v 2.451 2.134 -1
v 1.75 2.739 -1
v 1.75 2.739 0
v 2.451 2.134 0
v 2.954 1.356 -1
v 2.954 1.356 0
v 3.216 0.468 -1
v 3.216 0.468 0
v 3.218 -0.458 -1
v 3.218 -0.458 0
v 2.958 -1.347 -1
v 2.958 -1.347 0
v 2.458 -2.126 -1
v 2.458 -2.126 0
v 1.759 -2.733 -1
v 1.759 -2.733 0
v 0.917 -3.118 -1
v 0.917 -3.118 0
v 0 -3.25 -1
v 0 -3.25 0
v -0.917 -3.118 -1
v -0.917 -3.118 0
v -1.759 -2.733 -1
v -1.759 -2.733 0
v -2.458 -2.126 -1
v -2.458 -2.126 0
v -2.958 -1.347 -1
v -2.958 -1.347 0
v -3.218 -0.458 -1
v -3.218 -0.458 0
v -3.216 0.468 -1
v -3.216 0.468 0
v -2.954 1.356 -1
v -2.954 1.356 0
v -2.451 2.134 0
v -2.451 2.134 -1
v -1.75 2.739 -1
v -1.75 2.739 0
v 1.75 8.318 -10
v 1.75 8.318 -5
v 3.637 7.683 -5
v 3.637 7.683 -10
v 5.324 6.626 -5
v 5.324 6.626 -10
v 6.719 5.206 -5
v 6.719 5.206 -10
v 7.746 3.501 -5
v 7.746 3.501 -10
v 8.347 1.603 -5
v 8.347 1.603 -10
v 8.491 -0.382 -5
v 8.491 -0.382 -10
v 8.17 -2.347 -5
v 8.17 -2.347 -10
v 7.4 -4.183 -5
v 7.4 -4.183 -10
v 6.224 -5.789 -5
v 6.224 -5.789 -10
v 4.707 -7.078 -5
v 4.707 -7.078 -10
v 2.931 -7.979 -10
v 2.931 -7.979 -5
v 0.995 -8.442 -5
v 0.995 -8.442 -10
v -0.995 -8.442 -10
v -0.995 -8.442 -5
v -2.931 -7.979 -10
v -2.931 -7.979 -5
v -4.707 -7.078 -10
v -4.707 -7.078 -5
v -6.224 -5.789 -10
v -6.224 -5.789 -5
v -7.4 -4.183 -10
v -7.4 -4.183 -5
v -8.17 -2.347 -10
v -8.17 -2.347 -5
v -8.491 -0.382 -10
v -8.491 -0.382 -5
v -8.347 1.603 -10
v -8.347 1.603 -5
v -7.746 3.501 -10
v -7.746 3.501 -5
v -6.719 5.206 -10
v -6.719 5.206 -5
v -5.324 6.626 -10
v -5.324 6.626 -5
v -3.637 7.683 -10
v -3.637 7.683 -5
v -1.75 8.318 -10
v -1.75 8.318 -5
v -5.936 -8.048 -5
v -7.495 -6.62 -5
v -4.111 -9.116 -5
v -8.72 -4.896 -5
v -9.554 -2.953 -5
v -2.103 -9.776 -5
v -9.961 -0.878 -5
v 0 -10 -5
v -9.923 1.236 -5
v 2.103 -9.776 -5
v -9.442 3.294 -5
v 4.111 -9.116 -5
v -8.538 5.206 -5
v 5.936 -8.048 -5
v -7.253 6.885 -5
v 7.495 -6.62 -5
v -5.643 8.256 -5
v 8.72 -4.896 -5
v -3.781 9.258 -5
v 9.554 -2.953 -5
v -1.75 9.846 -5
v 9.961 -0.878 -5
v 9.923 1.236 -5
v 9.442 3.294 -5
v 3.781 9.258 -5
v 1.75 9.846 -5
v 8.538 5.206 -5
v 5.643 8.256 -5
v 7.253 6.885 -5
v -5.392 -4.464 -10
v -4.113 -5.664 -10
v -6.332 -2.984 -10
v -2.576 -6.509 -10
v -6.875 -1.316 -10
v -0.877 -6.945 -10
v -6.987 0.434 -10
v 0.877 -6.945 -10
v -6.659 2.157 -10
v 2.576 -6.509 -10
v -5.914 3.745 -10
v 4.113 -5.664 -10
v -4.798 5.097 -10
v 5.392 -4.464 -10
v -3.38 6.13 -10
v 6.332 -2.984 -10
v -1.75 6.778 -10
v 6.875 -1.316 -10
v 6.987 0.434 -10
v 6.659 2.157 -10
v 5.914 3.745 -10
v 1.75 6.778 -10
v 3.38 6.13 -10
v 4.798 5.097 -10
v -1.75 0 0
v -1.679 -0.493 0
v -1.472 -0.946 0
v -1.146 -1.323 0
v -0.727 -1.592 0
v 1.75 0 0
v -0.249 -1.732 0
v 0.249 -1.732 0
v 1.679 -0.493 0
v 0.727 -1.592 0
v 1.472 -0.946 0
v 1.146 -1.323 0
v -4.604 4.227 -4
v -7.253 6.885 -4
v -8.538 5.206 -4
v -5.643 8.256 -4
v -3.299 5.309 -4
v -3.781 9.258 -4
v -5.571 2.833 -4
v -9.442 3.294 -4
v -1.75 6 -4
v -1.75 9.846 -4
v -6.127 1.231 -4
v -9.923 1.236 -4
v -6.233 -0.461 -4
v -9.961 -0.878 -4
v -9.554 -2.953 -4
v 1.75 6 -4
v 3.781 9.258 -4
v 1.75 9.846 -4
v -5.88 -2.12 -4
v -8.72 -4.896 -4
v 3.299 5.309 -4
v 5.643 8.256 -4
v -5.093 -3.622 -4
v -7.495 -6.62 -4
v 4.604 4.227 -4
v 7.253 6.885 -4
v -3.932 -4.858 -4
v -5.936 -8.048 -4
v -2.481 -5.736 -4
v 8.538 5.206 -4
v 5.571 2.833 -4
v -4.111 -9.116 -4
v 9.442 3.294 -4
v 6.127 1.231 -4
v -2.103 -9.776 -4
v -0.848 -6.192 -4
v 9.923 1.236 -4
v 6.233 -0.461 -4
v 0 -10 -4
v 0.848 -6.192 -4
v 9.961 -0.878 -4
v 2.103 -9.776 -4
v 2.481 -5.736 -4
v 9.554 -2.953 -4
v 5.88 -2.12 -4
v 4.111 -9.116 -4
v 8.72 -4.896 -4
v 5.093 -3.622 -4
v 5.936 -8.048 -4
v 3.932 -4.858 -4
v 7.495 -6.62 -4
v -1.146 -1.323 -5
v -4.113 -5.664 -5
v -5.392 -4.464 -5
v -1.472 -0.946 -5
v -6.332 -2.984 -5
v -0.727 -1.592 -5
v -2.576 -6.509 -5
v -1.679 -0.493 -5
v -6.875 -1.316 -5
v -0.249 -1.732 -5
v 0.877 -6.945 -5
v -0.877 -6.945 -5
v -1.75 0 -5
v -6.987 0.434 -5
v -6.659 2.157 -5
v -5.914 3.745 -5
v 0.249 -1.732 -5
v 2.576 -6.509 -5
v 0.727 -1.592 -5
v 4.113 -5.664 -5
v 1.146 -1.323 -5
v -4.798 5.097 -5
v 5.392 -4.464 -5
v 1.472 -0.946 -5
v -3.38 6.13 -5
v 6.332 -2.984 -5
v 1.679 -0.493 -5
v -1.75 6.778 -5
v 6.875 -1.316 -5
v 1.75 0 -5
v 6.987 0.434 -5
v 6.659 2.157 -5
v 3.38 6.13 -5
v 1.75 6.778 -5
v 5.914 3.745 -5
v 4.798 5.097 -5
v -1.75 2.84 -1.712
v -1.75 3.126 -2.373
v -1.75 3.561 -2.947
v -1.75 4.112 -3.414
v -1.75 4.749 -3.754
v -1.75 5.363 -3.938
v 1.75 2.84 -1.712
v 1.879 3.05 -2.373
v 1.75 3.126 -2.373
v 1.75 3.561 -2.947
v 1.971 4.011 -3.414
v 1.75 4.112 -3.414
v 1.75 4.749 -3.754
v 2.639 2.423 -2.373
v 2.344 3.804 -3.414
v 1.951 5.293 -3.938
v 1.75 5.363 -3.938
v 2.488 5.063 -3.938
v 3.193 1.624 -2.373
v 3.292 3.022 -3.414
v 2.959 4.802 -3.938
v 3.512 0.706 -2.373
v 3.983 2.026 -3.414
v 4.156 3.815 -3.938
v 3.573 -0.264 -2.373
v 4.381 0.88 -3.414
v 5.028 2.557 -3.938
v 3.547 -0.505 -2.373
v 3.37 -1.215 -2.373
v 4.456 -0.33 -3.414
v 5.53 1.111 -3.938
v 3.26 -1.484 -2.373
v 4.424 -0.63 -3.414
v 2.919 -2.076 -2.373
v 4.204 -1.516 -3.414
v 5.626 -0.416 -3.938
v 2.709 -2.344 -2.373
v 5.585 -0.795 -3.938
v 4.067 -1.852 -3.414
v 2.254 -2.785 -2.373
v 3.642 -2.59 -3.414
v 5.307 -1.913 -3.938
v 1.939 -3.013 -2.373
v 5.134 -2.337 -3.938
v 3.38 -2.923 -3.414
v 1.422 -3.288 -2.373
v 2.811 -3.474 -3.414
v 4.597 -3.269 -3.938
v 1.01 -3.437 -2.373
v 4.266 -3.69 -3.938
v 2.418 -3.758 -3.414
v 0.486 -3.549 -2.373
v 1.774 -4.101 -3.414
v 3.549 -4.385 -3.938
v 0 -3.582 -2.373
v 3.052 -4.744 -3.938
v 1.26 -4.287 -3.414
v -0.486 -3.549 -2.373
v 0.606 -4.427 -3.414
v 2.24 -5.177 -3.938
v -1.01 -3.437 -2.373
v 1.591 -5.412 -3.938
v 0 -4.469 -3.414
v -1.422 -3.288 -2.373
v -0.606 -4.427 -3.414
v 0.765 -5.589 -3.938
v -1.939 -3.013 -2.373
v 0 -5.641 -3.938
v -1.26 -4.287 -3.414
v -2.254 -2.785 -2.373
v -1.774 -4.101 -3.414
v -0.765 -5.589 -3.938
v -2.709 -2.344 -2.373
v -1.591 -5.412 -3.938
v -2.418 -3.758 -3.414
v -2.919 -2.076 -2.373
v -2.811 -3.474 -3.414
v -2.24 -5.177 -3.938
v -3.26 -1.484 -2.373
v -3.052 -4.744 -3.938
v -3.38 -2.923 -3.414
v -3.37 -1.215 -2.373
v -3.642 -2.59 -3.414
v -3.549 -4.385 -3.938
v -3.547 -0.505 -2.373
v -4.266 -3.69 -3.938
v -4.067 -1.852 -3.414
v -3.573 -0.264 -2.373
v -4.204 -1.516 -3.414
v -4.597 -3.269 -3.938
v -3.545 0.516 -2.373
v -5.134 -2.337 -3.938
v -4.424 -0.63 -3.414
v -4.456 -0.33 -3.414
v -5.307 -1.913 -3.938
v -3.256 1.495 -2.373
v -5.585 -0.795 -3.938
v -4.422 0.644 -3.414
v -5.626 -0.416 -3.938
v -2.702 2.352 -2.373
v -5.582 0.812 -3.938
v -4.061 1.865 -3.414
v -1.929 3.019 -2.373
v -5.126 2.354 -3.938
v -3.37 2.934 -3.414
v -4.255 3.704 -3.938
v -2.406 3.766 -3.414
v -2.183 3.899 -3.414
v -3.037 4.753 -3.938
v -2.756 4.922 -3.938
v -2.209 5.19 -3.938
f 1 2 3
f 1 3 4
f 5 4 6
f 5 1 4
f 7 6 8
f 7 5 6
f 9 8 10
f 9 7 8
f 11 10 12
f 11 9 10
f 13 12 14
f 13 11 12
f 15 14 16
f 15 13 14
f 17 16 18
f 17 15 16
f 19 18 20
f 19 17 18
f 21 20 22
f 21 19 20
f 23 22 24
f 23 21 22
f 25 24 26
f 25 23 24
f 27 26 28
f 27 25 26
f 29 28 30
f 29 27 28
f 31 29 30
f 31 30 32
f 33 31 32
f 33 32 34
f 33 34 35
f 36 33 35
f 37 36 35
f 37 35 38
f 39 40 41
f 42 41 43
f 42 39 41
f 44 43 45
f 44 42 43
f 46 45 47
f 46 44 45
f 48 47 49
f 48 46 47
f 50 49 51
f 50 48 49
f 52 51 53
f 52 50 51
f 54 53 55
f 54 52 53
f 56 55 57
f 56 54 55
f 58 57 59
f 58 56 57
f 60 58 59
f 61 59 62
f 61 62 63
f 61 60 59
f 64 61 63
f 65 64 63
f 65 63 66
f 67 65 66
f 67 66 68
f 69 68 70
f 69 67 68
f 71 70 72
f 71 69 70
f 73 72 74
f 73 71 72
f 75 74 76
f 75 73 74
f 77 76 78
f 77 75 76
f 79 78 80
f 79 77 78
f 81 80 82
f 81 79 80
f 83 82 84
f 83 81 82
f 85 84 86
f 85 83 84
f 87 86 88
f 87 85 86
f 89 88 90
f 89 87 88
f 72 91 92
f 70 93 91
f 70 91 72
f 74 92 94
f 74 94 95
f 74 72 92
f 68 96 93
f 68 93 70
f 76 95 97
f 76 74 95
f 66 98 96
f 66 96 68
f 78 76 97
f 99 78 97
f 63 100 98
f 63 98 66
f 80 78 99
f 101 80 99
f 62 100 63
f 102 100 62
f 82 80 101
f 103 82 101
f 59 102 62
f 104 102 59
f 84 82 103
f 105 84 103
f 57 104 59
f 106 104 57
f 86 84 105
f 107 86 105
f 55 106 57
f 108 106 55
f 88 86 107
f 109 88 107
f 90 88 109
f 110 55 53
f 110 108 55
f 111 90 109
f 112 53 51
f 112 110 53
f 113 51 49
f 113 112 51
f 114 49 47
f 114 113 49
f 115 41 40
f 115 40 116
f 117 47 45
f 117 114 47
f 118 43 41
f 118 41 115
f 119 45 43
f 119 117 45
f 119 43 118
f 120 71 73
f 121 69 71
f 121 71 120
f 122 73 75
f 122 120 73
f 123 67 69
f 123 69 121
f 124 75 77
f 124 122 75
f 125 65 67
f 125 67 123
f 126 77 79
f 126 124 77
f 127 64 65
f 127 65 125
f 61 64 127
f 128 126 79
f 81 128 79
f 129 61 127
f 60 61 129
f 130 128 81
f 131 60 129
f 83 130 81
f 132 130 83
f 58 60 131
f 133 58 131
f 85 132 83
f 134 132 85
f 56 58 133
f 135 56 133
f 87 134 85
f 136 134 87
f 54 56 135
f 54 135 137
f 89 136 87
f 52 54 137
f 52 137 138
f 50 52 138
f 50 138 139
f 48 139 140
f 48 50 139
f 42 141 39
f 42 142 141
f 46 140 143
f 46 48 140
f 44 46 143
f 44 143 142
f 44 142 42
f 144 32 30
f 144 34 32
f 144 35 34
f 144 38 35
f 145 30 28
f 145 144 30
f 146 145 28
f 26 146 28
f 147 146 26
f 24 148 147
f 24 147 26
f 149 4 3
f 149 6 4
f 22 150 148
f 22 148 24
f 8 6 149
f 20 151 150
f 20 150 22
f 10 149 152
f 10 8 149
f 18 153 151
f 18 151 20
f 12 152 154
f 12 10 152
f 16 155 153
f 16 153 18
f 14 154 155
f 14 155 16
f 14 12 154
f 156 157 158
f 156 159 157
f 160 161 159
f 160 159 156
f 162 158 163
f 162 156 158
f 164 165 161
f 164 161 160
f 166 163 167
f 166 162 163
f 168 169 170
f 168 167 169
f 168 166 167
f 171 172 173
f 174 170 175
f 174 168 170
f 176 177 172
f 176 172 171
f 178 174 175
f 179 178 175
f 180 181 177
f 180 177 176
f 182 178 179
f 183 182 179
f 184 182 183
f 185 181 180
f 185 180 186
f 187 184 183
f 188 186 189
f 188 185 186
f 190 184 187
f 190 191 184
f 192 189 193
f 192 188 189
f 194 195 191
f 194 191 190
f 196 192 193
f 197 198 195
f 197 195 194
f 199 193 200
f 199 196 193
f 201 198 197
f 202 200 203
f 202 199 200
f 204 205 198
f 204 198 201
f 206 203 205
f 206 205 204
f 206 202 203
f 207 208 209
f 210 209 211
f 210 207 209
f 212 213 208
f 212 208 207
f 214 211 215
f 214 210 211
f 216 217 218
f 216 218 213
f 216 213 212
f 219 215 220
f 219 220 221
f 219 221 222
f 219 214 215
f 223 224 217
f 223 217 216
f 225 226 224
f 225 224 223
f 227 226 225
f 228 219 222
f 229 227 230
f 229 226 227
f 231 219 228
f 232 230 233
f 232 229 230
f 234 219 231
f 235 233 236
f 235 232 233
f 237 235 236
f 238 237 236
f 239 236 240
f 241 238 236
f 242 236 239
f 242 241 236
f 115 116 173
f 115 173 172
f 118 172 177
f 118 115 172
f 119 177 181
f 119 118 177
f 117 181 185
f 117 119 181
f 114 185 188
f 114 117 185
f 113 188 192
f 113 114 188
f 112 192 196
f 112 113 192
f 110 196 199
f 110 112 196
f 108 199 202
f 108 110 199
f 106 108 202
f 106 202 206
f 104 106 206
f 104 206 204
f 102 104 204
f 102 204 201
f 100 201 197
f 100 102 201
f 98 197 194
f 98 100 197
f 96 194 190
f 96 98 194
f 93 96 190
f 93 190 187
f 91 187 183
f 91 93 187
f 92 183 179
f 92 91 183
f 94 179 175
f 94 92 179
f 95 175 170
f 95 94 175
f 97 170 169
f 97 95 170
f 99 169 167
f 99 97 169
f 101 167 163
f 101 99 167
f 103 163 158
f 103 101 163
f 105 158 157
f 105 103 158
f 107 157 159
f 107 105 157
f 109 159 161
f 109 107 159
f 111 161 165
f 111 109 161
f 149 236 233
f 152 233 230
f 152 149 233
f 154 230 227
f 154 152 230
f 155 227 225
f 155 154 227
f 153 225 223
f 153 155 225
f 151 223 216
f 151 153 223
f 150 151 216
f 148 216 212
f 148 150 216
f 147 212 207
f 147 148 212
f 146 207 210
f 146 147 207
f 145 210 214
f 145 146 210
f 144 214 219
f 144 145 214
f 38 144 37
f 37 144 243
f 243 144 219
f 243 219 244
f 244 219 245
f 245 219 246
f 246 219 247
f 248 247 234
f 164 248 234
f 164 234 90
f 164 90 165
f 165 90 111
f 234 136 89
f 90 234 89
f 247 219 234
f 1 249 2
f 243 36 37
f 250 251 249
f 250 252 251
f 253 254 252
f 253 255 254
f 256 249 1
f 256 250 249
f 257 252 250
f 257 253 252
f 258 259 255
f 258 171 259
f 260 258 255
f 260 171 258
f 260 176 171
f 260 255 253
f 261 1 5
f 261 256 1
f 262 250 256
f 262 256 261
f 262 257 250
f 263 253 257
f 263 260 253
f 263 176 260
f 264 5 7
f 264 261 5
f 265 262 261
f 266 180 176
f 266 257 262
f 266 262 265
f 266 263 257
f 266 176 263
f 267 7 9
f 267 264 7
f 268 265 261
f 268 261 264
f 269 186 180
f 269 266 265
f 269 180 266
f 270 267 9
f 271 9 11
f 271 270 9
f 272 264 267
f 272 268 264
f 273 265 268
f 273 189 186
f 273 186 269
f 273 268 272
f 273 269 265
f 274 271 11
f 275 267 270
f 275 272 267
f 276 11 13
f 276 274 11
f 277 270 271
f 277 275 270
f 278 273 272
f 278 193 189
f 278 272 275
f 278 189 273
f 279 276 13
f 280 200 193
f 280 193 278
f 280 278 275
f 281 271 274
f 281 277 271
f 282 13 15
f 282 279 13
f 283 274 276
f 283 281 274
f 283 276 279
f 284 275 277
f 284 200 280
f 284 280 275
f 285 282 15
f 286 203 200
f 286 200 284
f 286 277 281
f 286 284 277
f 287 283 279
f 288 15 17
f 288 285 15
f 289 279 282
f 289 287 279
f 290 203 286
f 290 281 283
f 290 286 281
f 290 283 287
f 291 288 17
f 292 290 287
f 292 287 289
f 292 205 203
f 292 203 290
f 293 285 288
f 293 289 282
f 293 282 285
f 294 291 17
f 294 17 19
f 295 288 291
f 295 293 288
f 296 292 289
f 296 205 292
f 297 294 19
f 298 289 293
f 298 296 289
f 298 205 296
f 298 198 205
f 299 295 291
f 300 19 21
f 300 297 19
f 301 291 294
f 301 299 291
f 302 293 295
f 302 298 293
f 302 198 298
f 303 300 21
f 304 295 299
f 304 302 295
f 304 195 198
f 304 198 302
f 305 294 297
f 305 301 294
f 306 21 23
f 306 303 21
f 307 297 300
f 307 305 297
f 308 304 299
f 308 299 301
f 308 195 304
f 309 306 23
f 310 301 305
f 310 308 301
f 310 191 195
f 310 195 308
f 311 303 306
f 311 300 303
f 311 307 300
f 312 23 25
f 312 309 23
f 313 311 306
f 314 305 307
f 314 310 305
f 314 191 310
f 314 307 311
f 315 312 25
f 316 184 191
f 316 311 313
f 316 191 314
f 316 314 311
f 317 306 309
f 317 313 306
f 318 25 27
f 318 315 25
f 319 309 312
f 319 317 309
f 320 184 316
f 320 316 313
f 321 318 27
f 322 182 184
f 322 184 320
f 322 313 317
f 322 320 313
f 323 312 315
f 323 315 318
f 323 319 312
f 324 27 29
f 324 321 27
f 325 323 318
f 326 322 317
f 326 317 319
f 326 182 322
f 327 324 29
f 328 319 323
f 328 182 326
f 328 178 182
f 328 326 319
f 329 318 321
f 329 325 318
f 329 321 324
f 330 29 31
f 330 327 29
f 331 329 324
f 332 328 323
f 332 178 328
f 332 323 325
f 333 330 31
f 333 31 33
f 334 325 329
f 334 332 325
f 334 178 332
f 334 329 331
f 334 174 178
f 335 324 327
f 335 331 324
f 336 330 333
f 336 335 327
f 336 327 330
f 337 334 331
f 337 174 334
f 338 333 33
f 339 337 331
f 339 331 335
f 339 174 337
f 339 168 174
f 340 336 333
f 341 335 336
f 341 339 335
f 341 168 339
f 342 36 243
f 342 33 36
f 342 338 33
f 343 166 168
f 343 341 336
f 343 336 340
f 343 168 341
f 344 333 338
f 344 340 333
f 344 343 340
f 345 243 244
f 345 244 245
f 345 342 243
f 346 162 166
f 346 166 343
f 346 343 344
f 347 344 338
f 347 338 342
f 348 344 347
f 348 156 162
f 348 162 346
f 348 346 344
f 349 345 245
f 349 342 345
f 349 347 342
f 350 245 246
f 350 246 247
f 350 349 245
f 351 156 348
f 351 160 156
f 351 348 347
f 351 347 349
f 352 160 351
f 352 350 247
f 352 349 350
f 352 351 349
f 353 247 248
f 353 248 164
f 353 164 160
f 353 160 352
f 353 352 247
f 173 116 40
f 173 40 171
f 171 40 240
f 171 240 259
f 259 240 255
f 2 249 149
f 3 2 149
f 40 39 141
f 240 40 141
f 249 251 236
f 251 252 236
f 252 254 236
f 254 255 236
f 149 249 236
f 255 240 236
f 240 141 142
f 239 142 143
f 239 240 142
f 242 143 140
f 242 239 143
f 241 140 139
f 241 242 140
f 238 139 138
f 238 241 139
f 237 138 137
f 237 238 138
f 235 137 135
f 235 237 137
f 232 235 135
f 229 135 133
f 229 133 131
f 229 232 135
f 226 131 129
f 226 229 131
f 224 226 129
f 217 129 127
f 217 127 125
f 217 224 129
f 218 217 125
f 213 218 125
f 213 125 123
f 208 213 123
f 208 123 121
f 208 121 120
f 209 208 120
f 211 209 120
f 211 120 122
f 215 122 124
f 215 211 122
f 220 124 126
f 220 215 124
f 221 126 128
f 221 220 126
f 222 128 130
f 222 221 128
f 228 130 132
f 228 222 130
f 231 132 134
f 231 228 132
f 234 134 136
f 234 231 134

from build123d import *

# Parameters (mm, degrees)
CUT_EXTRUDE1_DEPTH      = 6
CUT_EXTRUDE1_DEPTH_BACK = 6


with BuildPart() as part:
    # Sketch1 → Revolve1 (revolve)
    with BuildSketch(Plane(origin=(0, 0, 0), x_dir=(0, 0, -1), z_dir=(1, 0, 0))):
        with BuildLine():
            Line((0, 1.75), (0, 3.25))
            Line((0, 3.25), (1, 3.25))
            ThreePointArc((1, 3.25), (3.121320344, 4.128679656), (4, 6.25))
            Line((4, 6.25), (4, 10))
            Line((4, 10), (5, 10))
            Line((5, 10), (5, 8.5))
            Line((5, 8.5), (10, 8.5))
            Line((10, 8.5), (10, 7))
            Line((10, 7), (5, 7))
            Line((5, 7), (5, 1.75))
            Line((5, 1.75), (0, 1.75))
        make_face()
    revolve(axis=Axis((0, 0, 0), (0, 0, -1)))

    # Sketch2 → Cut-Extrude1 (cut, two sides)
    with BuildSketch(Plane(origin=(0, 0, -5), x_dir=(-1, 0, 0), z_dir=(0, 0, -1))) as cut_extrude1_sk:
        with BuildLine():
            Line((-1.75, 9.845684334), (-1.75, 6.777720856))
            ThreePointArc((-1.75, 6.777720856), (0, 7), (1.75, 6.777720856))
            Line((1.75, 6.777720856), (1.75, 9.845684334))
            ThreePointArc((1.75, 9.845684334), (0, 10), (-1.75, 9.845684334))
        make_face()
        with BuildLine():
            Line((-1.75, 6.777720856), (-1.75, 0))
            ThreePointArc((-1.75, 0), (0, 1.75), (1.75, 0))
            Line((1.75, 0), (1.75, 6.777720856))
            ThreePointArc((1.75, 6.777720856), (0, 7), (-1.75, 6.777720856))
        make_face()
    extrude(amount=CUT_EXTRUDE1_DEPTH, mode=Mode.SUBTRACT)
    extrude(cut_extrude1_sk.sketch, amount=-CUT_EXTRUDE1_DEPTH_BACK, mode=Mode.SUBTRACT)


solid = part.part
